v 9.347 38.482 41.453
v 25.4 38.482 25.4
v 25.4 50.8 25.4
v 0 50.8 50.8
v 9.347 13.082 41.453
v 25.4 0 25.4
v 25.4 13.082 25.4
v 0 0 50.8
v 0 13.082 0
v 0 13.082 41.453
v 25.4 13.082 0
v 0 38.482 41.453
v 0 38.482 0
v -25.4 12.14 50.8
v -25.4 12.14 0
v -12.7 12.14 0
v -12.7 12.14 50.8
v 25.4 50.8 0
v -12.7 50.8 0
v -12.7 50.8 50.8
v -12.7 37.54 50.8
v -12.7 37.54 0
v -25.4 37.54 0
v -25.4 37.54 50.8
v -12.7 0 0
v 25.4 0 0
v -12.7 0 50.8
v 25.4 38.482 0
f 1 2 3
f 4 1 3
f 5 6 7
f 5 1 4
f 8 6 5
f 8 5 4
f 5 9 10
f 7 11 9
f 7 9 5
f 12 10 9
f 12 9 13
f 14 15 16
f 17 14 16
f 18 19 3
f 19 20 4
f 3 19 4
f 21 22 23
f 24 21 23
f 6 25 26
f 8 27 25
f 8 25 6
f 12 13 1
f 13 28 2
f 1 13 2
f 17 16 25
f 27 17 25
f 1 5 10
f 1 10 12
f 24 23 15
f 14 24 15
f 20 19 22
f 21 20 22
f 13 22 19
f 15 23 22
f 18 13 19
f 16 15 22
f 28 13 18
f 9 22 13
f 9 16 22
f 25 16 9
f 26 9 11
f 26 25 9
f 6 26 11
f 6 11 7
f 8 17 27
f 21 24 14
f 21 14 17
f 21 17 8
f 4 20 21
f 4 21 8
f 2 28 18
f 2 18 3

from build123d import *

# Parameters (mm, degrees)
F1_DEPTH = 50.8
F3_DEPTH = 50.8
F4_W     = 25.4
F4_H     = 41.4527870002
F5_DEPTH = 25.4


with BuildPart() as f1:
    # F0 (on Top) → F1 (new body)
    with BuildSketch(Plane.XY):
        Polygon((-12.7, 0), (0, 0), (0, 50.8), (-12.7, 50.8), (-12.7, 37.5397042634), (-25.4, 37.5397042634), (-25.4, 12.1397042634), (-12.7, 12.1397042634), align=None)
    extrude(amount=F1_DEPTH)

    # F2 (on face) → F3 (join)
    with BuildSketch(Plane.XZ):
        Polygon((0, 50.8), (0, 0), (25.4, 0), (25.4, 25.4), align=None)
    extrude(amount=-F3_DEPTH)

    # F4 (on face) → F5 (cut)
    with BuildSketch(Plane.YZ.offset(25.4)):
        with Locations((25.7822034553, 20.7263935001)):
            Rectangle(F4_W, F4_H)
    extrude(amount=-F5_DEPTH, mode=Mode.SUBTRACT)


solid = f1.part
